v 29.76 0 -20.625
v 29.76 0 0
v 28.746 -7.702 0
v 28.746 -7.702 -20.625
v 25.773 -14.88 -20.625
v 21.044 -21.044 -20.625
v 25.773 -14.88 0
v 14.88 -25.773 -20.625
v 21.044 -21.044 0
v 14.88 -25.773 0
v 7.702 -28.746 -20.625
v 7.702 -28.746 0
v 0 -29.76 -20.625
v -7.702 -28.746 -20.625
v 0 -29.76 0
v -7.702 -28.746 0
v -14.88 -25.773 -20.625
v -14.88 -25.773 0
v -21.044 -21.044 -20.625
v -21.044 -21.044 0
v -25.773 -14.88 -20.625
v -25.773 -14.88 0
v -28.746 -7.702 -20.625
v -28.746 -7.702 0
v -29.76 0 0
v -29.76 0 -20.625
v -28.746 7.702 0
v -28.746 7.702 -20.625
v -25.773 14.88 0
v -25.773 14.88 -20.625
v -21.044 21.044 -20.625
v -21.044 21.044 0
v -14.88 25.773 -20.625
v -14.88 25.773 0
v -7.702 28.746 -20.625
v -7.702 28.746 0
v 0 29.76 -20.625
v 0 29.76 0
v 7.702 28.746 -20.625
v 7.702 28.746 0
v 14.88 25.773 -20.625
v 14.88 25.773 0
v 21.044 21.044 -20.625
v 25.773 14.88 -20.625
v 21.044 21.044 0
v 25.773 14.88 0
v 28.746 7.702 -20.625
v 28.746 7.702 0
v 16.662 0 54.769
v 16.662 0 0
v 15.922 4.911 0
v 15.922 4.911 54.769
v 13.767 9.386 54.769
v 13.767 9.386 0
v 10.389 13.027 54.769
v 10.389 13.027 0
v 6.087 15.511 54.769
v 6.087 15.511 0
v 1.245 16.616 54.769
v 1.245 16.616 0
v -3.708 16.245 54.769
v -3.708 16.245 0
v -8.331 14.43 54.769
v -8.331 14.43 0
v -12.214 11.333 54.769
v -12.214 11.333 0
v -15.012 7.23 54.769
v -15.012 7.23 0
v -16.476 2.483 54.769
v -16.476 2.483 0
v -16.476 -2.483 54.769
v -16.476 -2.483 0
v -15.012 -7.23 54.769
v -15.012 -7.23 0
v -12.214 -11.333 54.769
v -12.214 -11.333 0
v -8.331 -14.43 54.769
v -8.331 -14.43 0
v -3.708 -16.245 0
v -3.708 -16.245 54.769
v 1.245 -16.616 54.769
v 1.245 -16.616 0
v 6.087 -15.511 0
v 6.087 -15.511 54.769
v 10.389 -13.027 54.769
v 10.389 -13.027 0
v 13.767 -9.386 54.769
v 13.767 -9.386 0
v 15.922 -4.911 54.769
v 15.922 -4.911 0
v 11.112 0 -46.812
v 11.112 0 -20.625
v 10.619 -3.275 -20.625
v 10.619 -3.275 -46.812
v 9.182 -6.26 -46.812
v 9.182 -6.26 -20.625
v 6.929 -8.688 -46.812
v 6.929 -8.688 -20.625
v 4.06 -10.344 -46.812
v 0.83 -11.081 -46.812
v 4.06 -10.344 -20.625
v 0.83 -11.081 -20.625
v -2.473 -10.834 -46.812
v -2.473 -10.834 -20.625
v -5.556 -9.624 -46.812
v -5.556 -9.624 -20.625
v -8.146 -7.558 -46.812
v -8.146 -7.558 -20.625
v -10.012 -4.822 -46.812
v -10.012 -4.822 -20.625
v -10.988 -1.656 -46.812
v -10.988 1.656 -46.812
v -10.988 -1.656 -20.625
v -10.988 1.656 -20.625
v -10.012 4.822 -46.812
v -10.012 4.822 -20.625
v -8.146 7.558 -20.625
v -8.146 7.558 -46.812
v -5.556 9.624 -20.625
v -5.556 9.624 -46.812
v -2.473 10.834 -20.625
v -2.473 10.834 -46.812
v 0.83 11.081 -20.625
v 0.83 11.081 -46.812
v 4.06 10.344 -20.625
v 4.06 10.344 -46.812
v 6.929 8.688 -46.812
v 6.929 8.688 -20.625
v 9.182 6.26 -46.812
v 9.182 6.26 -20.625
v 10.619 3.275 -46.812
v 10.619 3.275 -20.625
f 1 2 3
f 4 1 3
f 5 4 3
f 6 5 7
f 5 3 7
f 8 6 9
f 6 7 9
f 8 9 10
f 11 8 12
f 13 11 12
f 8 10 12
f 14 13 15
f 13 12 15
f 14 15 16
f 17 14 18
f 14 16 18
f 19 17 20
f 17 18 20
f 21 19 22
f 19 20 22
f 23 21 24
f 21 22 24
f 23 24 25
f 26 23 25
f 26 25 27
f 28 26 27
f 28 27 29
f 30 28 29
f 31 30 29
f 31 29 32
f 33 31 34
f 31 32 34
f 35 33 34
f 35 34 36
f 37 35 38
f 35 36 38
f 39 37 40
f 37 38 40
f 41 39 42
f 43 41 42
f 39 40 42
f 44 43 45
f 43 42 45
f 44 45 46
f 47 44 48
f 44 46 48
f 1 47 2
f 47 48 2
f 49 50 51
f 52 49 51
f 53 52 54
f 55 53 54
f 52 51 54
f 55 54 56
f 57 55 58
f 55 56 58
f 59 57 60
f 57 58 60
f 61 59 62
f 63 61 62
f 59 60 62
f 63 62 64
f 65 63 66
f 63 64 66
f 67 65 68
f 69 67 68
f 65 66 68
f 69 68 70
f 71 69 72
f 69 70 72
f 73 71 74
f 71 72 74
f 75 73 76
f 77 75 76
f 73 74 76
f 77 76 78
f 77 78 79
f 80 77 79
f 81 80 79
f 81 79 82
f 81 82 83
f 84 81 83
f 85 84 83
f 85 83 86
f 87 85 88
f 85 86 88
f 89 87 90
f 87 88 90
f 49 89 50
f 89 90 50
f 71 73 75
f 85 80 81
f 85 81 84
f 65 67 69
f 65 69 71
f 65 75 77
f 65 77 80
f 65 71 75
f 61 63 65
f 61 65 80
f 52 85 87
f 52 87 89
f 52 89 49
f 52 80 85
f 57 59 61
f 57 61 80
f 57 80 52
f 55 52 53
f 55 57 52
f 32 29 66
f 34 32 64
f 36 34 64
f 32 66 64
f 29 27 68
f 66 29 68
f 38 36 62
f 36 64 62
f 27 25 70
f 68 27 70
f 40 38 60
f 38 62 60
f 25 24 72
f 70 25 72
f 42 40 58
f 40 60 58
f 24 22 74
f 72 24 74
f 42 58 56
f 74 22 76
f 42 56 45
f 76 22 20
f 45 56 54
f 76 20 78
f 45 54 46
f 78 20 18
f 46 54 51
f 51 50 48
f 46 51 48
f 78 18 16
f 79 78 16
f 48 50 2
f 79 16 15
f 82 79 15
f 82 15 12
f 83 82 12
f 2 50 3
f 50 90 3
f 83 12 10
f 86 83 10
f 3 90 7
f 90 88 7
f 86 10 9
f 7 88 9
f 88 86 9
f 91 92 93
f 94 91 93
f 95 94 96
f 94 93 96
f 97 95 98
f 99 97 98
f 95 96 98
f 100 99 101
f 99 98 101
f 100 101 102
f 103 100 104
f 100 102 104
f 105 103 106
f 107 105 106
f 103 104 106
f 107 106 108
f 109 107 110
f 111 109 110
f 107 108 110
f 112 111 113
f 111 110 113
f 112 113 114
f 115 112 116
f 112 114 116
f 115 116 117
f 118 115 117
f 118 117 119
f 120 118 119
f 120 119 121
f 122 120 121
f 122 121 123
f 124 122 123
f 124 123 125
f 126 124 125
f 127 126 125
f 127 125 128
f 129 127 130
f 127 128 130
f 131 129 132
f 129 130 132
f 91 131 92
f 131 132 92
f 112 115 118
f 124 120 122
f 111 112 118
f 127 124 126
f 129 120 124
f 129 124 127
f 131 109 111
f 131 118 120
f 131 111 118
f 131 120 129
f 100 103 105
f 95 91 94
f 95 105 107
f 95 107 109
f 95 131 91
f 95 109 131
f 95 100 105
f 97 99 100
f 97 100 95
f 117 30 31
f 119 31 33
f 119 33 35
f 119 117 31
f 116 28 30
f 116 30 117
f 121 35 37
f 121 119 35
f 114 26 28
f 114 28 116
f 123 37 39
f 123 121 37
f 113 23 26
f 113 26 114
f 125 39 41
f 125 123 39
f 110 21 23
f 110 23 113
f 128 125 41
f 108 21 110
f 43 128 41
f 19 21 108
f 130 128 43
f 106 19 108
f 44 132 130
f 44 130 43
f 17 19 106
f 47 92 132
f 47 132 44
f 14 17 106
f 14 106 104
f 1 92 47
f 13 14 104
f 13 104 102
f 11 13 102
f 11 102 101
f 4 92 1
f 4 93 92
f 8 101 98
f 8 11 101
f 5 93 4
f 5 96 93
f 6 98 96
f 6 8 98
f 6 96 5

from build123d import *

# Parameters (mm, degrees)
F0_R     = 16.6624
F1_DEPTH = 54.76875
F2_R     = 29.760102
F3_DEPTH = 20.6248
F4_R     = 11.1125
F5_DEPTH = 26.1874


with BuildPart() as f1:
    # F0 (on Top) → F1 (new body)
    with BuildSketch(Plane.XY):
        Circle(F0_R)
    extrude(amount=F1_DEPTH)

    # F2 (on face) → F3 (join)
    with BuildSketch(Plane(origin=(0, 0, 0), x_dir=(1, 0, 0), z_dir=(0, 0, -1))):
        Circle(F2_R)
    extrude(amount=F3_DEPTH)

    # F4 (on face) → F5 (join)
    with BuildSketch(Plane(origin=(0, 0, -20.6248), x_dir=(1, 0, 0), z_dir=(0, 0, -1))):
        Circle(F4_R)
    extrude(amount=F5_DEPTH)


solid = f1.part
